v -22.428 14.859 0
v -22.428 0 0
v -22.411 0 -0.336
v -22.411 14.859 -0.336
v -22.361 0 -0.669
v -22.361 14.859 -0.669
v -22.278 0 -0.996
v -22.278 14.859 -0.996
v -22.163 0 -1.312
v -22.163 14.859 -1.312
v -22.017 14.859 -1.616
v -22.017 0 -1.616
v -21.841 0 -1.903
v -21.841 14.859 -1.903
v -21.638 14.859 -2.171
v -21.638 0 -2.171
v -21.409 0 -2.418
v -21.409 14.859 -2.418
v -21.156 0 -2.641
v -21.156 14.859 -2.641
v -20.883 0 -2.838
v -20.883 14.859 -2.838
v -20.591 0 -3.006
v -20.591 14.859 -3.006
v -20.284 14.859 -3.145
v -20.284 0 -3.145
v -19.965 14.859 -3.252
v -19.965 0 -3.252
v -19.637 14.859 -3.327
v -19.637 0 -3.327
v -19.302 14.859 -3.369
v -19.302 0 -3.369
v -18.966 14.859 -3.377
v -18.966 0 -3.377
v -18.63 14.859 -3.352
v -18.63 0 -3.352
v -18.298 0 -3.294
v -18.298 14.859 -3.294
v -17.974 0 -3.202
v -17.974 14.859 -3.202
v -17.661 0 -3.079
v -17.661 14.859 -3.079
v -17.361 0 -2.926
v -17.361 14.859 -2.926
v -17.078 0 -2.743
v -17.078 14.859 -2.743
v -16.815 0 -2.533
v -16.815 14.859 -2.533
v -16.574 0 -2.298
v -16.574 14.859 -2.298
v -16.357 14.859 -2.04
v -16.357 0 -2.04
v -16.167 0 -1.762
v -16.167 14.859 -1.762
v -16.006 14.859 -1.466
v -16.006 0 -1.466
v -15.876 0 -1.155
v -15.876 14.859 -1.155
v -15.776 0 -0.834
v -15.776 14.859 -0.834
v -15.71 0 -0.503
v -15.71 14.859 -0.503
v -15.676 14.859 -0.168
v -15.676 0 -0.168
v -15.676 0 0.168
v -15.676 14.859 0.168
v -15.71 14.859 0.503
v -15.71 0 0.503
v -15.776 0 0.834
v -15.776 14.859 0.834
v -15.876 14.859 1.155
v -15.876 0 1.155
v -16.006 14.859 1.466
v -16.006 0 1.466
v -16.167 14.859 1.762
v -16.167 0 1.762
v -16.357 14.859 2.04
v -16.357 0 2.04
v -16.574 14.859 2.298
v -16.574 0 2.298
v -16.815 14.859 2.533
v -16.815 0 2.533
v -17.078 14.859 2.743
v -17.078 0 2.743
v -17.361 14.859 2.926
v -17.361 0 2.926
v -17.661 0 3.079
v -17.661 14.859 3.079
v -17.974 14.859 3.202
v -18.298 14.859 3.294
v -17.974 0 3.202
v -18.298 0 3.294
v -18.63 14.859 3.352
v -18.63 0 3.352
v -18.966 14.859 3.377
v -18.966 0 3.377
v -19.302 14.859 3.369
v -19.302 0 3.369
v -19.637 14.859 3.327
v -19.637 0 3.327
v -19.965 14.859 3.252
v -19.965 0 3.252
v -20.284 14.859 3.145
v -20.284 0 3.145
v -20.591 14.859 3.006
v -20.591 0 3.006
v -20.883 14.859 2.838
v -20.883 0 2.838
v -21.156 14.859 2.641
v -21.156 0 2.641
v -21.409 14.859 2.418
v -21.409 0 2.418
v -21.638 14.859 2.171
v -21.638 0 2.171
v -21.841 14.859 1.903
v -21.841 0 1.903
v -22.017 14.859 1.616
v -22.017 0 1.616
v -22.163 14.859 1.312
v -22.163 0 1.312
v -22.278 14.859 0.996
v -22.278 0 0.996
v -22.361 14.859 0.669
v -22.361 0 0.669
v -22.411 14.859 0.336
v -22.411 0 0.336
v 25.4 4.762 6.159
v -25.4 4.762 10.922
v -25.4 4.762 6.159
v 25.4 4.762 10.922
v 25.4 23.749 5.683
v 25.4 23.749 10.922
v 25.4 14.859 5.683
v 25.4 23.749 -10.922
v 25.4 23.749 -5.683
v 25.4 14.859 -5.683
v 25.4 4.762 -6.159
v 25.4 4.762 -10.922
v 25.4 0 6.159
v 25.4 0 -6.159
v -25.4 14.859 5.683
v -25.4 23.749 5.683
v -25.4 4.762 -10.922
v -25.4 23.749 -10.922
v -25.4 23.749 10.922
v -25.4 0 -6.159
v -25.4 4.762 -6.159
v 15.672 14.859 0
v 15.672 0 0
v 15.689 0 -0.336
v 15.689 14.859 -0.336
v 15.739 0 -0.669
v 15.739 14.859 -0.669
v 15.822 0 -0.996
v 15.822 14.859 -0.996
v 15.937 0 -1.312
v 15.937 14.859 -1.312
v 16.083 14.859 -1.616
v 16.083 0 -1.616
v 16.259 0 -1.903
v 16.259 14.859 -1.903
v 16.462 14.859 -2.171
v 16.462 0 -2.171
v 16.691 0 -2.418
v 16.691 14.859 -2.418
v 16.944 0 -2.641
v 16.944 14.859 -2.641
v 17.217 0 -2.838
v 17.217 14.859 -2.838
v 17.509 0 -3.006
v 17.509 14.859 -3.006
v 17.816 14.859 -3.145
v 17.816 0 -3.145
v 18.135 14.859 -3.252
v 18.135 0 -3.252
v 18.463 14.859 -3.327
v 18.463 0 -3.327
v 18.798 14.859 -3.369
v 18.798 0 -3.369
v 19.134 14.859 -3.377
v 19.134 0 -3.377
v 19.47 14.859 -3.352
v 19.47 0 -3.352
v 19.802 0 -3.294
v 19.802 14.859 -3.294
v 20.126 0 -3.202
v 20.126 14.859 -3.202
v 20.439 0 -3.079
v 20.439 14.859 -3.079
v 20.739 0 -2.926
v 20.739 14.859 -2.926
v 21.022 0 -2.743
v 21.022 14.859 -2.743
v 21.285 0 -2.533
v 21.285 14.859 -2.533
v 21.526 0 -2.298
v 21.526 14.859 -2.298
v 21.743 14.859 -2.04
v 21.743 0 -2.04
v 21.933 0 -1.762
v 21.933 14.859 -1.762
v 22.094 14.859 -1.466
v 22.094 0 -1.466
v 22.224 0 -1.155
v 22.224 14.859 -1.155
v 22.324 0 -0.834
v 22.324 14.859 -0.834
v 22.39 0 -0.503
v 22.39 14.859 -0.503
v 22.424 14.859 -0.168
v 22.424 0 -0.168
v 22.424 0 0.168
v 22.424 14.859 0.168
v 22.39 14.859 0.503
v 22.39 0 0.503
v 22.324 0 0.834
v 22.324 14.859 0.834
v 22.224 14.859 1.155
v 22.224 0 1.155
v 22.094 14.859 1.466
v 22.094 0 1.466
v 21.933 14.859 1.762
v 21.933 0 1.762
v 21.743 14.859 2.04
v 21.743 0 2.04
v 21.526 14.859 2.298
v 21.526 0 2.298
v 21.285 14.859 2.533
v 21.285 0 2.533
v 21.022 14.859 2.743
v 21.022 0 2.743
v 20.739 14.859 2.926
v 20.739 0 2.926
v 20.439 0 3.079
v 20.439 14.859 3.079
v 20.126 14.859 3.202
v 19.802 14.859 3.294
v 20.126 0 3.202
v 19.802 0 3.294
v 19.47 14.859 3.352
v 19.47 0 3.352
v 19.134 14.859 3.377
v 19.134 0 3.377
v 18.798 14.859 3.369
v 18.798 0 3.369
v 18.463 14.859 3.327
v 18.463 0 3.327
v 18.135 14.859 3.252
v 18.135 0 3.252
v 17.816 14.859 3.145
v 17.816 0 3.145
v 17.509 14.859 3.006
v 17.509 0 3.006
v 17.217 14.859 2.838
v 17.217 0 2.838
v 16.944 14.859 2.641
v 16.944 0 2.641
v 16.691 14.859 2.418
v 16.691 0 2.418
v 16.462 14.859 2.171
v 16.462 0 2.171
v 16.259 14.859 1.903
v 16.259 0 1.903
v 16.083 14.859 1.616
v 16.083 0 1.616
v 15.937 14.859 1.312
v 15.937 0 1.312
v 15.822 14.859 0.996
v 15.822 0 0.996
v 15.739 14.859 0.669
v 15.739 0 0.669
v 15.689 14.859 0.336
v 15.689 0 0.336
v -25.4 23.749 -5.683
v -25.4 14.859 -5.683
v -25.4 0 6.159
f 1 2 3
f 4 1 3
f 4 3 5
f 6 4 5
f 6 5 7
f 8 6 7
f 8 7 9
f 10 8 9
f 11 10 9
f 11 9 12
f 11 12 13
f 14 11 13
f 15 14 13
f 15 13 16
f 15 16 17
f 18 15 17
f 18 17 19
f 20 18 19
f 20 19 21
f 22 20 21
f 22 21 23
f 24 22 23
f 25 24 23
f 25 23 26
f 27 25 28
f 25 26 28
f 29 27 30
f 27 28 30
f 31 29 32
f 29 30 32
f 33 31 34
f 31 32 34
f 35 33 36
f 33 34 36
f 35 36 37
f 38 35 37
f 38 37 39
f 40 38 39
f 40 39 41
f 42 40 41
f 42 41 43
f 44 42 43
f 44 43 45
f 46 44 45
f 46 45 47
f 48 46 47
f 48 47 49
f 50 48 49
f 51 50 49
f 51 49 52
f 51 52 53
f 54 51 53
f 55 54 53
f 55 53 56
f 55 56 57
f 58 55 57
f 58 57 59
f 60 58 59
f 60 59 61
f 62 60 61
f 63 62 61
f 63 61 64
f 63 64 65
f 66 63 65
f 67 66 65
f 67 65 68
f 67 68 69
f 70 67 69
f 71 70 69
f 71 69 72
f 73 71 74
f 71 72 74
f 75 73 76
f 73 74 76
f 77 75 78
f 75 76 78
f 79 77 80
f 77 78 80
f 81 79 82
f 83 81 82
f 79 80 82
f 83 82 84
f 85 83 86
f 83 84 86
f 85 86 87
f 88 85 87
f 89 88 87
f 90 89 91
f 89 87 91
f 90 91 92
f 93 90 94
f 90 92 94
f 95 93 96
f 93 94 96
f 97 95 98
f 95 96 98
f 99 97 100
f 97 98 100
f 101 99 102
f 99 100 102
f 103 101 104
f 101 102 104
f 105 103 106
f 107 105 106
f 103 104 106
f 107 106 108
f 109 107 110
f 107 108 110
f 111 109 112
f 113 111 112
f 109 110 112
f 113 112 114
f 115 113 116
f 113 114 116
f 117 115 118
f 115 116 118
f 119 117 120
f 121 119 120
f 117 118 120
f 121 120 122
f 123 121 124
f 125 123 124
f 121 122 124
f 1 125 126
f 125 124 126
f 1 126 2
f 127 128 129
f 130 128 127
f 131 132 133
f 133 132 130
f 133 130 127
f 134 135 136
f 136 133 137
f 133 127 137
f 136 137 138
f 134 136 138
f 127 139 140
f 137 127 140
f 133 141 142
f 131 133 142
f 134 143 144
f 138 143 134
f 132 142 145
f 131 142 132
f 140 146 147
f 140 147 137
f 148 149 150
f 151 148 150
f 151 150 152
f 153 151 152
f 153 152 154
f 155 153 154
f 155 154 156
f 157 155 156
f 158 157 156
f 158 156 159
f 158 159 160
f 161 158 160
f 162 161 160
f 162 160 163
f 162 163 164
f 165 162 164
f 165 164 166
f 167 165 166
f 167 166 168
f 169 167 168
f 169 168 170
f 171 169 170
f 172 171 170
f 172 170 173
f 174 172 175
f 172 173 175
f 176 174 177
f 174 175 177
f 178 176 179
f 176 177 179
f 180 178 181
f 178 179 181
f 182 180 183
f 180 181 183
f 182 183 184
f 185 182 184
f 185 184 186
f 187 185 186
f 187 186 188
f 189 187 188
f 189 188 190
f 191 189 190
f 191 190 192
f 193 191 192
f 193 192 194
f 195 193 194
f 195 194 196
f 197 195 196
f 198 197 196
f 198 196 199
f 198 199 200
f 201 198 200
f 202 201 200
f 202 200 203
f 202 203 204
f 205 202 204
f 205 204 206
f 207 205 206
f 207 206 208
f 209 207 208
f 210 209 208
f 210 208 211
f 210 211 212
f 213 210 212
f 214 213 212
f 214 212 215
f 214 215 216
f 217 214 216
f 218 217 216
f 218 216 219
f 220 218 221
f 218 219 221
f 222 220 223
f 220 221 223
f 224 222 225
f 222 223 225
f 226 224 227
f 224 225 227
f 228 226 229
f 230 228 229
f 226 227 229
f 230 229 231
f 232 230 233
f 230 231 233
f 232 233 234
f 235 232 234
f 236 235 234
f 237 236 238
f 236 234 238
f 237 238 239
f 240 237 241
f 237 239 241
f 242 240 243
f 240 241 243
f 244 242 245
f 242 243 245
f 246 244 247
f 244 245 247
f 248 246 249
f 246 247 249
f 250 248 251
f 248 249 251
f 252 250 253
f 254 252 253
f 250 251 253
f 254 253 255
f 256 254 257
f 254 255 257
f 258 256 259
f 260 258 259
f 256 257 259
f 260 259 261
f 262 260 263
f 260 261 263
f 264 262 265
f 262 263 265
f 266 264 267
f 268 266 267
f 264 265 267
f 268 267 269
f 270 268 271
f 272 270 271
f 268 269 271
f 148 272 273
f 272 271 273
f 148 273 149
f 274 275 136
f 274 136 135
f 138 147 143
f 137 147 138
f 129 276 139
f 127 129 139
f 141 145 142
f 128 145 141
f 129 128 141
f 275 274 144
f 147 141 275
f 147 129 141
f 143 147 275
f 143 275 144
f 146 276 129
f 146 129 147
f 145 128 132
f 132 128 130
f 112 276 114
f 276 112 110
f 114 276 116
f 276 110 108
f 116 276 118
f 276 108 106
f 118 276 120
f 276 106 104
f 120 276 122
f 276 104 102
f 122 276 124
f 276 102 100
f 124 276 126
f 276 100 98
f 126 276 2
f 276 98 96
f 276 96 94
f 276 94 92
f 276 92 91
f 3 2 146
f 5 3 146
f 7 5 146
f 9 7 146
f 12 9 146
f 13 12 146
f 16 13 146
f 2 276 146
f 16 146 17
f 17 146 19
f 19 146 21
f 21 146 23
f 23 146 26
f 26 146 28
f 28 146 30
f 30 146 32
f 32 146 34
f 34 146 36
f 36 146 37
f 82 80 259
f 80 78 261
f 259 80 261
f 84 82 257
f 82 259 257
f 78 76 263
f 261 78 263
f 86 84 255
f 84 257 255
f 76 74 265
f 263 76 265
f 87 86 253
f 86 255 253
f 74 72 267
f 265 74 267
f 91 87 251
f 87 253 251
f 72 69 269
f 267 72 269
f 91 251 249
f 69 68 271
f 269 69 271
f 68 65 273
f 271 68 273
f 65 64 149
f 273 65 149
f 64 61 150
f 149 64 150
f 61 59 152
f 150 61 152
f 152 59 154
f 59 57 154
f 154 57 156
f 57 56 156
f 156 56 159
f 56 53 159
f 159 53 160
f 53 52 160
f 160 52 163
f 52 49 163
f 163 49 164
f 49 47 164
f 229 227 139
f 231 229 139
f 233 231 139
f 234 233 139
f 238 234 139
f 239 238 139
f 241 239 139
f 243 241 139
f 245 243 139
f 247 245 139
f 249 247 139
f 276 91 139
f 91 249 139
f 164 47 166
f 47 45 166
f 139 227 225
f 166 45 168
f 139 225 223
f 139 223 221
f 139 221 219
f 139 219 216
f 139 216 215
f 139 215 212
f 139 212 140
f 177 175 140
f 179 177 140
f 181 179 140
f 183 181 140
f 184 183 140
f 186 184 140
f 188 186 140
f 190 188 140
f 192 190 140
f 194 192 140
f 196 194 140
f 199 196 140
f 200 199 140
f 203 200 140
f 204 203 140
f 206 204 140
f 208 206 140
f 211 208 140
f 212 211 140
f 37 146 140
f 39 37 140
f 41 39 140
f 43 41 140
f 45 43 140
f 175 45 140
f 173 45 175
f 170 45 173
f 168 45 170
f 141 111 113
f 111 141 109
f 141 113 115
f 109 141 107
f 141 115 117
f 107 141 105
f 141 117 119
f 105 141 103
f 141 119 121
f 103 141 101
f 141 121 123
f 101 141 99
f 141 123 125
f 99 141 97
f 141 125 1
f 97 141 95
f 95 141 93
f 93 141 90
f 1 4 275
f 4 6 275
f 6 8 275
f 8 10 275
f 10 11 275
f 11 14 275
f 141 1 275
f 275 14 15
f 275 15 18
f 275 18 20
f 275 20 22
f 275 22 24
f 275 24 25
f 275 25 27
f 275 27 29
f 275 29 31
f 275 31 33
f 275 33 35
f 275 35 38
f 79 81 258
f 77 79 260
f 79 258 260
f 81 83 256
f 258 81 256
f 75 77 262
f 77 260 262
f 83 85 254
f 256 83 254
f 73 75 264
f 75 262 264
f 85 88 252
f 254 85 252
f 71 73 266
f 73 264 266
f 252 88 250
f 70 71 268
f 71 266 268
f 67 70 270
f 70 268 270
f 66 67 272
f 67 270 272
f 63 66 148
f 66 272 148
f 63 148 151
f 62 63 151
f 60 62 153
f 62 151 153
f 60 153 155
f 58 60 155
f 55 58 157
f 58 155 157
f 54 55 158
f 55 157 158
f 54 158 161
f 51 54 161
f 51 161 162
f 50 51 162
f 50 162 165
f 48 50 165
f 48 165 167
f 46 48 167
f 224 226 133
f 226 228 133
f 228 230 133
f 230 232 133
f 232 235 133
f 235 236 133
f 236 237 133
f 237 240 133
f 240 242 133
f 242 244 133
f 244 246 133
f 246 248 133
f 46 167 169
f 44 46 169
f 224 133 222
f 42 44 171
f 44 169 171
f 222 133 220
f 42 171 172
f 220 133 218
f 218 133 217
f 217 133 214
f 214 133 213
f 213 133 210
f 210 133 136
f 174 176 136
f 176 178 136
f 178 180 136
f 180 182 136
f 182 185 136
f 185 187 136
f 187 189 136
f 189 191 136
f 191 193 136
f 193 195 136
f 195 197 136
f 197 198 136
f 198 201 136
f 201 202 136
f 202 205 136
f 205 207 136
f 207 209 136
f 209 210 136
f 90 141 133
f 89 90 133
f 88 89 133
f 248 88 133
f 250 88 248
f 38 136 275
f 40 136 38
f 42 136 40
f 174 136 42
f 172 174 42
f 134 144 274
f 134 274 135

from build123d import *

# Parameters (mm, degrees)
SKETCH1_W                            = 50.8
SKETCH1_H                            = 21.844
STOCK_DEPTH                          = 23.749
CLEARANCE_HOLES_FOR_MOUNTING_BOLTS_D = 6.7564
SKETCH5_W                            = 50.8
SKETCH5_H                            = 4.7625
CLEARANCE_RABBIT_DEPTH               = 4.7625
SKETCH6_W                            = 11.3665
SKETCH6_H                            = 17.78
NUT_SLOT_DEPTH                       = 58.130946824


with BuildPart() as part:
    # Sketch1 → Stock (new body)
    with BuildSketch(Plane(origin=(0, 0, 0), x_dir=(1, 0, 0), z_dir=(0, 1, 0))):
        Rectangle(SKETCH1_W, SKETCH1_H)
    extrude(amount=STOCK_DEPTH)

    # Clearance holes for Mounting Bolts (through all)
    with Locations(Plane(origin=(0, 23.749, 0), x_dir=(1, 0, 0), z_dir=(0, 1, 0))):
        with Locations((-19.05, 0), (19.05, 0)):
            Hole(CLEARANCE_HOLES_FOR_MOUNTING_BOLTS_D / 2)

    # Sketch5 → Clearance Rabbit (cut)
    with BuildSketch(Plane.XZ):
        with Locations((0, 8.54075)):
            Rectangle(SKETCH5_W, SKETCH5_H)
        with Locations((0, -8.54075)):
            Rectangle(SKETCH5_W, SKETCH5_H)
    extrude(amount=-CLEARANCE_RABBIT_DEPTH, mode=Mode.SUBTRACT)

    # Sketch6 → Nut Slot (cut, through all)
    with BuildSketch(Plane(origin=(25.4, 0, 0), x_dir=(0, 0, -1), z_dir=(1, 0, 0))):
        with Locations((0, 23.749)):
            Rectangle(SKETCH6_W, SKETCH6_H)
    extrude(amount=-NUT_SLOT_DEPTH, mode=Mode.SUBTRACT)


solid = part.part
